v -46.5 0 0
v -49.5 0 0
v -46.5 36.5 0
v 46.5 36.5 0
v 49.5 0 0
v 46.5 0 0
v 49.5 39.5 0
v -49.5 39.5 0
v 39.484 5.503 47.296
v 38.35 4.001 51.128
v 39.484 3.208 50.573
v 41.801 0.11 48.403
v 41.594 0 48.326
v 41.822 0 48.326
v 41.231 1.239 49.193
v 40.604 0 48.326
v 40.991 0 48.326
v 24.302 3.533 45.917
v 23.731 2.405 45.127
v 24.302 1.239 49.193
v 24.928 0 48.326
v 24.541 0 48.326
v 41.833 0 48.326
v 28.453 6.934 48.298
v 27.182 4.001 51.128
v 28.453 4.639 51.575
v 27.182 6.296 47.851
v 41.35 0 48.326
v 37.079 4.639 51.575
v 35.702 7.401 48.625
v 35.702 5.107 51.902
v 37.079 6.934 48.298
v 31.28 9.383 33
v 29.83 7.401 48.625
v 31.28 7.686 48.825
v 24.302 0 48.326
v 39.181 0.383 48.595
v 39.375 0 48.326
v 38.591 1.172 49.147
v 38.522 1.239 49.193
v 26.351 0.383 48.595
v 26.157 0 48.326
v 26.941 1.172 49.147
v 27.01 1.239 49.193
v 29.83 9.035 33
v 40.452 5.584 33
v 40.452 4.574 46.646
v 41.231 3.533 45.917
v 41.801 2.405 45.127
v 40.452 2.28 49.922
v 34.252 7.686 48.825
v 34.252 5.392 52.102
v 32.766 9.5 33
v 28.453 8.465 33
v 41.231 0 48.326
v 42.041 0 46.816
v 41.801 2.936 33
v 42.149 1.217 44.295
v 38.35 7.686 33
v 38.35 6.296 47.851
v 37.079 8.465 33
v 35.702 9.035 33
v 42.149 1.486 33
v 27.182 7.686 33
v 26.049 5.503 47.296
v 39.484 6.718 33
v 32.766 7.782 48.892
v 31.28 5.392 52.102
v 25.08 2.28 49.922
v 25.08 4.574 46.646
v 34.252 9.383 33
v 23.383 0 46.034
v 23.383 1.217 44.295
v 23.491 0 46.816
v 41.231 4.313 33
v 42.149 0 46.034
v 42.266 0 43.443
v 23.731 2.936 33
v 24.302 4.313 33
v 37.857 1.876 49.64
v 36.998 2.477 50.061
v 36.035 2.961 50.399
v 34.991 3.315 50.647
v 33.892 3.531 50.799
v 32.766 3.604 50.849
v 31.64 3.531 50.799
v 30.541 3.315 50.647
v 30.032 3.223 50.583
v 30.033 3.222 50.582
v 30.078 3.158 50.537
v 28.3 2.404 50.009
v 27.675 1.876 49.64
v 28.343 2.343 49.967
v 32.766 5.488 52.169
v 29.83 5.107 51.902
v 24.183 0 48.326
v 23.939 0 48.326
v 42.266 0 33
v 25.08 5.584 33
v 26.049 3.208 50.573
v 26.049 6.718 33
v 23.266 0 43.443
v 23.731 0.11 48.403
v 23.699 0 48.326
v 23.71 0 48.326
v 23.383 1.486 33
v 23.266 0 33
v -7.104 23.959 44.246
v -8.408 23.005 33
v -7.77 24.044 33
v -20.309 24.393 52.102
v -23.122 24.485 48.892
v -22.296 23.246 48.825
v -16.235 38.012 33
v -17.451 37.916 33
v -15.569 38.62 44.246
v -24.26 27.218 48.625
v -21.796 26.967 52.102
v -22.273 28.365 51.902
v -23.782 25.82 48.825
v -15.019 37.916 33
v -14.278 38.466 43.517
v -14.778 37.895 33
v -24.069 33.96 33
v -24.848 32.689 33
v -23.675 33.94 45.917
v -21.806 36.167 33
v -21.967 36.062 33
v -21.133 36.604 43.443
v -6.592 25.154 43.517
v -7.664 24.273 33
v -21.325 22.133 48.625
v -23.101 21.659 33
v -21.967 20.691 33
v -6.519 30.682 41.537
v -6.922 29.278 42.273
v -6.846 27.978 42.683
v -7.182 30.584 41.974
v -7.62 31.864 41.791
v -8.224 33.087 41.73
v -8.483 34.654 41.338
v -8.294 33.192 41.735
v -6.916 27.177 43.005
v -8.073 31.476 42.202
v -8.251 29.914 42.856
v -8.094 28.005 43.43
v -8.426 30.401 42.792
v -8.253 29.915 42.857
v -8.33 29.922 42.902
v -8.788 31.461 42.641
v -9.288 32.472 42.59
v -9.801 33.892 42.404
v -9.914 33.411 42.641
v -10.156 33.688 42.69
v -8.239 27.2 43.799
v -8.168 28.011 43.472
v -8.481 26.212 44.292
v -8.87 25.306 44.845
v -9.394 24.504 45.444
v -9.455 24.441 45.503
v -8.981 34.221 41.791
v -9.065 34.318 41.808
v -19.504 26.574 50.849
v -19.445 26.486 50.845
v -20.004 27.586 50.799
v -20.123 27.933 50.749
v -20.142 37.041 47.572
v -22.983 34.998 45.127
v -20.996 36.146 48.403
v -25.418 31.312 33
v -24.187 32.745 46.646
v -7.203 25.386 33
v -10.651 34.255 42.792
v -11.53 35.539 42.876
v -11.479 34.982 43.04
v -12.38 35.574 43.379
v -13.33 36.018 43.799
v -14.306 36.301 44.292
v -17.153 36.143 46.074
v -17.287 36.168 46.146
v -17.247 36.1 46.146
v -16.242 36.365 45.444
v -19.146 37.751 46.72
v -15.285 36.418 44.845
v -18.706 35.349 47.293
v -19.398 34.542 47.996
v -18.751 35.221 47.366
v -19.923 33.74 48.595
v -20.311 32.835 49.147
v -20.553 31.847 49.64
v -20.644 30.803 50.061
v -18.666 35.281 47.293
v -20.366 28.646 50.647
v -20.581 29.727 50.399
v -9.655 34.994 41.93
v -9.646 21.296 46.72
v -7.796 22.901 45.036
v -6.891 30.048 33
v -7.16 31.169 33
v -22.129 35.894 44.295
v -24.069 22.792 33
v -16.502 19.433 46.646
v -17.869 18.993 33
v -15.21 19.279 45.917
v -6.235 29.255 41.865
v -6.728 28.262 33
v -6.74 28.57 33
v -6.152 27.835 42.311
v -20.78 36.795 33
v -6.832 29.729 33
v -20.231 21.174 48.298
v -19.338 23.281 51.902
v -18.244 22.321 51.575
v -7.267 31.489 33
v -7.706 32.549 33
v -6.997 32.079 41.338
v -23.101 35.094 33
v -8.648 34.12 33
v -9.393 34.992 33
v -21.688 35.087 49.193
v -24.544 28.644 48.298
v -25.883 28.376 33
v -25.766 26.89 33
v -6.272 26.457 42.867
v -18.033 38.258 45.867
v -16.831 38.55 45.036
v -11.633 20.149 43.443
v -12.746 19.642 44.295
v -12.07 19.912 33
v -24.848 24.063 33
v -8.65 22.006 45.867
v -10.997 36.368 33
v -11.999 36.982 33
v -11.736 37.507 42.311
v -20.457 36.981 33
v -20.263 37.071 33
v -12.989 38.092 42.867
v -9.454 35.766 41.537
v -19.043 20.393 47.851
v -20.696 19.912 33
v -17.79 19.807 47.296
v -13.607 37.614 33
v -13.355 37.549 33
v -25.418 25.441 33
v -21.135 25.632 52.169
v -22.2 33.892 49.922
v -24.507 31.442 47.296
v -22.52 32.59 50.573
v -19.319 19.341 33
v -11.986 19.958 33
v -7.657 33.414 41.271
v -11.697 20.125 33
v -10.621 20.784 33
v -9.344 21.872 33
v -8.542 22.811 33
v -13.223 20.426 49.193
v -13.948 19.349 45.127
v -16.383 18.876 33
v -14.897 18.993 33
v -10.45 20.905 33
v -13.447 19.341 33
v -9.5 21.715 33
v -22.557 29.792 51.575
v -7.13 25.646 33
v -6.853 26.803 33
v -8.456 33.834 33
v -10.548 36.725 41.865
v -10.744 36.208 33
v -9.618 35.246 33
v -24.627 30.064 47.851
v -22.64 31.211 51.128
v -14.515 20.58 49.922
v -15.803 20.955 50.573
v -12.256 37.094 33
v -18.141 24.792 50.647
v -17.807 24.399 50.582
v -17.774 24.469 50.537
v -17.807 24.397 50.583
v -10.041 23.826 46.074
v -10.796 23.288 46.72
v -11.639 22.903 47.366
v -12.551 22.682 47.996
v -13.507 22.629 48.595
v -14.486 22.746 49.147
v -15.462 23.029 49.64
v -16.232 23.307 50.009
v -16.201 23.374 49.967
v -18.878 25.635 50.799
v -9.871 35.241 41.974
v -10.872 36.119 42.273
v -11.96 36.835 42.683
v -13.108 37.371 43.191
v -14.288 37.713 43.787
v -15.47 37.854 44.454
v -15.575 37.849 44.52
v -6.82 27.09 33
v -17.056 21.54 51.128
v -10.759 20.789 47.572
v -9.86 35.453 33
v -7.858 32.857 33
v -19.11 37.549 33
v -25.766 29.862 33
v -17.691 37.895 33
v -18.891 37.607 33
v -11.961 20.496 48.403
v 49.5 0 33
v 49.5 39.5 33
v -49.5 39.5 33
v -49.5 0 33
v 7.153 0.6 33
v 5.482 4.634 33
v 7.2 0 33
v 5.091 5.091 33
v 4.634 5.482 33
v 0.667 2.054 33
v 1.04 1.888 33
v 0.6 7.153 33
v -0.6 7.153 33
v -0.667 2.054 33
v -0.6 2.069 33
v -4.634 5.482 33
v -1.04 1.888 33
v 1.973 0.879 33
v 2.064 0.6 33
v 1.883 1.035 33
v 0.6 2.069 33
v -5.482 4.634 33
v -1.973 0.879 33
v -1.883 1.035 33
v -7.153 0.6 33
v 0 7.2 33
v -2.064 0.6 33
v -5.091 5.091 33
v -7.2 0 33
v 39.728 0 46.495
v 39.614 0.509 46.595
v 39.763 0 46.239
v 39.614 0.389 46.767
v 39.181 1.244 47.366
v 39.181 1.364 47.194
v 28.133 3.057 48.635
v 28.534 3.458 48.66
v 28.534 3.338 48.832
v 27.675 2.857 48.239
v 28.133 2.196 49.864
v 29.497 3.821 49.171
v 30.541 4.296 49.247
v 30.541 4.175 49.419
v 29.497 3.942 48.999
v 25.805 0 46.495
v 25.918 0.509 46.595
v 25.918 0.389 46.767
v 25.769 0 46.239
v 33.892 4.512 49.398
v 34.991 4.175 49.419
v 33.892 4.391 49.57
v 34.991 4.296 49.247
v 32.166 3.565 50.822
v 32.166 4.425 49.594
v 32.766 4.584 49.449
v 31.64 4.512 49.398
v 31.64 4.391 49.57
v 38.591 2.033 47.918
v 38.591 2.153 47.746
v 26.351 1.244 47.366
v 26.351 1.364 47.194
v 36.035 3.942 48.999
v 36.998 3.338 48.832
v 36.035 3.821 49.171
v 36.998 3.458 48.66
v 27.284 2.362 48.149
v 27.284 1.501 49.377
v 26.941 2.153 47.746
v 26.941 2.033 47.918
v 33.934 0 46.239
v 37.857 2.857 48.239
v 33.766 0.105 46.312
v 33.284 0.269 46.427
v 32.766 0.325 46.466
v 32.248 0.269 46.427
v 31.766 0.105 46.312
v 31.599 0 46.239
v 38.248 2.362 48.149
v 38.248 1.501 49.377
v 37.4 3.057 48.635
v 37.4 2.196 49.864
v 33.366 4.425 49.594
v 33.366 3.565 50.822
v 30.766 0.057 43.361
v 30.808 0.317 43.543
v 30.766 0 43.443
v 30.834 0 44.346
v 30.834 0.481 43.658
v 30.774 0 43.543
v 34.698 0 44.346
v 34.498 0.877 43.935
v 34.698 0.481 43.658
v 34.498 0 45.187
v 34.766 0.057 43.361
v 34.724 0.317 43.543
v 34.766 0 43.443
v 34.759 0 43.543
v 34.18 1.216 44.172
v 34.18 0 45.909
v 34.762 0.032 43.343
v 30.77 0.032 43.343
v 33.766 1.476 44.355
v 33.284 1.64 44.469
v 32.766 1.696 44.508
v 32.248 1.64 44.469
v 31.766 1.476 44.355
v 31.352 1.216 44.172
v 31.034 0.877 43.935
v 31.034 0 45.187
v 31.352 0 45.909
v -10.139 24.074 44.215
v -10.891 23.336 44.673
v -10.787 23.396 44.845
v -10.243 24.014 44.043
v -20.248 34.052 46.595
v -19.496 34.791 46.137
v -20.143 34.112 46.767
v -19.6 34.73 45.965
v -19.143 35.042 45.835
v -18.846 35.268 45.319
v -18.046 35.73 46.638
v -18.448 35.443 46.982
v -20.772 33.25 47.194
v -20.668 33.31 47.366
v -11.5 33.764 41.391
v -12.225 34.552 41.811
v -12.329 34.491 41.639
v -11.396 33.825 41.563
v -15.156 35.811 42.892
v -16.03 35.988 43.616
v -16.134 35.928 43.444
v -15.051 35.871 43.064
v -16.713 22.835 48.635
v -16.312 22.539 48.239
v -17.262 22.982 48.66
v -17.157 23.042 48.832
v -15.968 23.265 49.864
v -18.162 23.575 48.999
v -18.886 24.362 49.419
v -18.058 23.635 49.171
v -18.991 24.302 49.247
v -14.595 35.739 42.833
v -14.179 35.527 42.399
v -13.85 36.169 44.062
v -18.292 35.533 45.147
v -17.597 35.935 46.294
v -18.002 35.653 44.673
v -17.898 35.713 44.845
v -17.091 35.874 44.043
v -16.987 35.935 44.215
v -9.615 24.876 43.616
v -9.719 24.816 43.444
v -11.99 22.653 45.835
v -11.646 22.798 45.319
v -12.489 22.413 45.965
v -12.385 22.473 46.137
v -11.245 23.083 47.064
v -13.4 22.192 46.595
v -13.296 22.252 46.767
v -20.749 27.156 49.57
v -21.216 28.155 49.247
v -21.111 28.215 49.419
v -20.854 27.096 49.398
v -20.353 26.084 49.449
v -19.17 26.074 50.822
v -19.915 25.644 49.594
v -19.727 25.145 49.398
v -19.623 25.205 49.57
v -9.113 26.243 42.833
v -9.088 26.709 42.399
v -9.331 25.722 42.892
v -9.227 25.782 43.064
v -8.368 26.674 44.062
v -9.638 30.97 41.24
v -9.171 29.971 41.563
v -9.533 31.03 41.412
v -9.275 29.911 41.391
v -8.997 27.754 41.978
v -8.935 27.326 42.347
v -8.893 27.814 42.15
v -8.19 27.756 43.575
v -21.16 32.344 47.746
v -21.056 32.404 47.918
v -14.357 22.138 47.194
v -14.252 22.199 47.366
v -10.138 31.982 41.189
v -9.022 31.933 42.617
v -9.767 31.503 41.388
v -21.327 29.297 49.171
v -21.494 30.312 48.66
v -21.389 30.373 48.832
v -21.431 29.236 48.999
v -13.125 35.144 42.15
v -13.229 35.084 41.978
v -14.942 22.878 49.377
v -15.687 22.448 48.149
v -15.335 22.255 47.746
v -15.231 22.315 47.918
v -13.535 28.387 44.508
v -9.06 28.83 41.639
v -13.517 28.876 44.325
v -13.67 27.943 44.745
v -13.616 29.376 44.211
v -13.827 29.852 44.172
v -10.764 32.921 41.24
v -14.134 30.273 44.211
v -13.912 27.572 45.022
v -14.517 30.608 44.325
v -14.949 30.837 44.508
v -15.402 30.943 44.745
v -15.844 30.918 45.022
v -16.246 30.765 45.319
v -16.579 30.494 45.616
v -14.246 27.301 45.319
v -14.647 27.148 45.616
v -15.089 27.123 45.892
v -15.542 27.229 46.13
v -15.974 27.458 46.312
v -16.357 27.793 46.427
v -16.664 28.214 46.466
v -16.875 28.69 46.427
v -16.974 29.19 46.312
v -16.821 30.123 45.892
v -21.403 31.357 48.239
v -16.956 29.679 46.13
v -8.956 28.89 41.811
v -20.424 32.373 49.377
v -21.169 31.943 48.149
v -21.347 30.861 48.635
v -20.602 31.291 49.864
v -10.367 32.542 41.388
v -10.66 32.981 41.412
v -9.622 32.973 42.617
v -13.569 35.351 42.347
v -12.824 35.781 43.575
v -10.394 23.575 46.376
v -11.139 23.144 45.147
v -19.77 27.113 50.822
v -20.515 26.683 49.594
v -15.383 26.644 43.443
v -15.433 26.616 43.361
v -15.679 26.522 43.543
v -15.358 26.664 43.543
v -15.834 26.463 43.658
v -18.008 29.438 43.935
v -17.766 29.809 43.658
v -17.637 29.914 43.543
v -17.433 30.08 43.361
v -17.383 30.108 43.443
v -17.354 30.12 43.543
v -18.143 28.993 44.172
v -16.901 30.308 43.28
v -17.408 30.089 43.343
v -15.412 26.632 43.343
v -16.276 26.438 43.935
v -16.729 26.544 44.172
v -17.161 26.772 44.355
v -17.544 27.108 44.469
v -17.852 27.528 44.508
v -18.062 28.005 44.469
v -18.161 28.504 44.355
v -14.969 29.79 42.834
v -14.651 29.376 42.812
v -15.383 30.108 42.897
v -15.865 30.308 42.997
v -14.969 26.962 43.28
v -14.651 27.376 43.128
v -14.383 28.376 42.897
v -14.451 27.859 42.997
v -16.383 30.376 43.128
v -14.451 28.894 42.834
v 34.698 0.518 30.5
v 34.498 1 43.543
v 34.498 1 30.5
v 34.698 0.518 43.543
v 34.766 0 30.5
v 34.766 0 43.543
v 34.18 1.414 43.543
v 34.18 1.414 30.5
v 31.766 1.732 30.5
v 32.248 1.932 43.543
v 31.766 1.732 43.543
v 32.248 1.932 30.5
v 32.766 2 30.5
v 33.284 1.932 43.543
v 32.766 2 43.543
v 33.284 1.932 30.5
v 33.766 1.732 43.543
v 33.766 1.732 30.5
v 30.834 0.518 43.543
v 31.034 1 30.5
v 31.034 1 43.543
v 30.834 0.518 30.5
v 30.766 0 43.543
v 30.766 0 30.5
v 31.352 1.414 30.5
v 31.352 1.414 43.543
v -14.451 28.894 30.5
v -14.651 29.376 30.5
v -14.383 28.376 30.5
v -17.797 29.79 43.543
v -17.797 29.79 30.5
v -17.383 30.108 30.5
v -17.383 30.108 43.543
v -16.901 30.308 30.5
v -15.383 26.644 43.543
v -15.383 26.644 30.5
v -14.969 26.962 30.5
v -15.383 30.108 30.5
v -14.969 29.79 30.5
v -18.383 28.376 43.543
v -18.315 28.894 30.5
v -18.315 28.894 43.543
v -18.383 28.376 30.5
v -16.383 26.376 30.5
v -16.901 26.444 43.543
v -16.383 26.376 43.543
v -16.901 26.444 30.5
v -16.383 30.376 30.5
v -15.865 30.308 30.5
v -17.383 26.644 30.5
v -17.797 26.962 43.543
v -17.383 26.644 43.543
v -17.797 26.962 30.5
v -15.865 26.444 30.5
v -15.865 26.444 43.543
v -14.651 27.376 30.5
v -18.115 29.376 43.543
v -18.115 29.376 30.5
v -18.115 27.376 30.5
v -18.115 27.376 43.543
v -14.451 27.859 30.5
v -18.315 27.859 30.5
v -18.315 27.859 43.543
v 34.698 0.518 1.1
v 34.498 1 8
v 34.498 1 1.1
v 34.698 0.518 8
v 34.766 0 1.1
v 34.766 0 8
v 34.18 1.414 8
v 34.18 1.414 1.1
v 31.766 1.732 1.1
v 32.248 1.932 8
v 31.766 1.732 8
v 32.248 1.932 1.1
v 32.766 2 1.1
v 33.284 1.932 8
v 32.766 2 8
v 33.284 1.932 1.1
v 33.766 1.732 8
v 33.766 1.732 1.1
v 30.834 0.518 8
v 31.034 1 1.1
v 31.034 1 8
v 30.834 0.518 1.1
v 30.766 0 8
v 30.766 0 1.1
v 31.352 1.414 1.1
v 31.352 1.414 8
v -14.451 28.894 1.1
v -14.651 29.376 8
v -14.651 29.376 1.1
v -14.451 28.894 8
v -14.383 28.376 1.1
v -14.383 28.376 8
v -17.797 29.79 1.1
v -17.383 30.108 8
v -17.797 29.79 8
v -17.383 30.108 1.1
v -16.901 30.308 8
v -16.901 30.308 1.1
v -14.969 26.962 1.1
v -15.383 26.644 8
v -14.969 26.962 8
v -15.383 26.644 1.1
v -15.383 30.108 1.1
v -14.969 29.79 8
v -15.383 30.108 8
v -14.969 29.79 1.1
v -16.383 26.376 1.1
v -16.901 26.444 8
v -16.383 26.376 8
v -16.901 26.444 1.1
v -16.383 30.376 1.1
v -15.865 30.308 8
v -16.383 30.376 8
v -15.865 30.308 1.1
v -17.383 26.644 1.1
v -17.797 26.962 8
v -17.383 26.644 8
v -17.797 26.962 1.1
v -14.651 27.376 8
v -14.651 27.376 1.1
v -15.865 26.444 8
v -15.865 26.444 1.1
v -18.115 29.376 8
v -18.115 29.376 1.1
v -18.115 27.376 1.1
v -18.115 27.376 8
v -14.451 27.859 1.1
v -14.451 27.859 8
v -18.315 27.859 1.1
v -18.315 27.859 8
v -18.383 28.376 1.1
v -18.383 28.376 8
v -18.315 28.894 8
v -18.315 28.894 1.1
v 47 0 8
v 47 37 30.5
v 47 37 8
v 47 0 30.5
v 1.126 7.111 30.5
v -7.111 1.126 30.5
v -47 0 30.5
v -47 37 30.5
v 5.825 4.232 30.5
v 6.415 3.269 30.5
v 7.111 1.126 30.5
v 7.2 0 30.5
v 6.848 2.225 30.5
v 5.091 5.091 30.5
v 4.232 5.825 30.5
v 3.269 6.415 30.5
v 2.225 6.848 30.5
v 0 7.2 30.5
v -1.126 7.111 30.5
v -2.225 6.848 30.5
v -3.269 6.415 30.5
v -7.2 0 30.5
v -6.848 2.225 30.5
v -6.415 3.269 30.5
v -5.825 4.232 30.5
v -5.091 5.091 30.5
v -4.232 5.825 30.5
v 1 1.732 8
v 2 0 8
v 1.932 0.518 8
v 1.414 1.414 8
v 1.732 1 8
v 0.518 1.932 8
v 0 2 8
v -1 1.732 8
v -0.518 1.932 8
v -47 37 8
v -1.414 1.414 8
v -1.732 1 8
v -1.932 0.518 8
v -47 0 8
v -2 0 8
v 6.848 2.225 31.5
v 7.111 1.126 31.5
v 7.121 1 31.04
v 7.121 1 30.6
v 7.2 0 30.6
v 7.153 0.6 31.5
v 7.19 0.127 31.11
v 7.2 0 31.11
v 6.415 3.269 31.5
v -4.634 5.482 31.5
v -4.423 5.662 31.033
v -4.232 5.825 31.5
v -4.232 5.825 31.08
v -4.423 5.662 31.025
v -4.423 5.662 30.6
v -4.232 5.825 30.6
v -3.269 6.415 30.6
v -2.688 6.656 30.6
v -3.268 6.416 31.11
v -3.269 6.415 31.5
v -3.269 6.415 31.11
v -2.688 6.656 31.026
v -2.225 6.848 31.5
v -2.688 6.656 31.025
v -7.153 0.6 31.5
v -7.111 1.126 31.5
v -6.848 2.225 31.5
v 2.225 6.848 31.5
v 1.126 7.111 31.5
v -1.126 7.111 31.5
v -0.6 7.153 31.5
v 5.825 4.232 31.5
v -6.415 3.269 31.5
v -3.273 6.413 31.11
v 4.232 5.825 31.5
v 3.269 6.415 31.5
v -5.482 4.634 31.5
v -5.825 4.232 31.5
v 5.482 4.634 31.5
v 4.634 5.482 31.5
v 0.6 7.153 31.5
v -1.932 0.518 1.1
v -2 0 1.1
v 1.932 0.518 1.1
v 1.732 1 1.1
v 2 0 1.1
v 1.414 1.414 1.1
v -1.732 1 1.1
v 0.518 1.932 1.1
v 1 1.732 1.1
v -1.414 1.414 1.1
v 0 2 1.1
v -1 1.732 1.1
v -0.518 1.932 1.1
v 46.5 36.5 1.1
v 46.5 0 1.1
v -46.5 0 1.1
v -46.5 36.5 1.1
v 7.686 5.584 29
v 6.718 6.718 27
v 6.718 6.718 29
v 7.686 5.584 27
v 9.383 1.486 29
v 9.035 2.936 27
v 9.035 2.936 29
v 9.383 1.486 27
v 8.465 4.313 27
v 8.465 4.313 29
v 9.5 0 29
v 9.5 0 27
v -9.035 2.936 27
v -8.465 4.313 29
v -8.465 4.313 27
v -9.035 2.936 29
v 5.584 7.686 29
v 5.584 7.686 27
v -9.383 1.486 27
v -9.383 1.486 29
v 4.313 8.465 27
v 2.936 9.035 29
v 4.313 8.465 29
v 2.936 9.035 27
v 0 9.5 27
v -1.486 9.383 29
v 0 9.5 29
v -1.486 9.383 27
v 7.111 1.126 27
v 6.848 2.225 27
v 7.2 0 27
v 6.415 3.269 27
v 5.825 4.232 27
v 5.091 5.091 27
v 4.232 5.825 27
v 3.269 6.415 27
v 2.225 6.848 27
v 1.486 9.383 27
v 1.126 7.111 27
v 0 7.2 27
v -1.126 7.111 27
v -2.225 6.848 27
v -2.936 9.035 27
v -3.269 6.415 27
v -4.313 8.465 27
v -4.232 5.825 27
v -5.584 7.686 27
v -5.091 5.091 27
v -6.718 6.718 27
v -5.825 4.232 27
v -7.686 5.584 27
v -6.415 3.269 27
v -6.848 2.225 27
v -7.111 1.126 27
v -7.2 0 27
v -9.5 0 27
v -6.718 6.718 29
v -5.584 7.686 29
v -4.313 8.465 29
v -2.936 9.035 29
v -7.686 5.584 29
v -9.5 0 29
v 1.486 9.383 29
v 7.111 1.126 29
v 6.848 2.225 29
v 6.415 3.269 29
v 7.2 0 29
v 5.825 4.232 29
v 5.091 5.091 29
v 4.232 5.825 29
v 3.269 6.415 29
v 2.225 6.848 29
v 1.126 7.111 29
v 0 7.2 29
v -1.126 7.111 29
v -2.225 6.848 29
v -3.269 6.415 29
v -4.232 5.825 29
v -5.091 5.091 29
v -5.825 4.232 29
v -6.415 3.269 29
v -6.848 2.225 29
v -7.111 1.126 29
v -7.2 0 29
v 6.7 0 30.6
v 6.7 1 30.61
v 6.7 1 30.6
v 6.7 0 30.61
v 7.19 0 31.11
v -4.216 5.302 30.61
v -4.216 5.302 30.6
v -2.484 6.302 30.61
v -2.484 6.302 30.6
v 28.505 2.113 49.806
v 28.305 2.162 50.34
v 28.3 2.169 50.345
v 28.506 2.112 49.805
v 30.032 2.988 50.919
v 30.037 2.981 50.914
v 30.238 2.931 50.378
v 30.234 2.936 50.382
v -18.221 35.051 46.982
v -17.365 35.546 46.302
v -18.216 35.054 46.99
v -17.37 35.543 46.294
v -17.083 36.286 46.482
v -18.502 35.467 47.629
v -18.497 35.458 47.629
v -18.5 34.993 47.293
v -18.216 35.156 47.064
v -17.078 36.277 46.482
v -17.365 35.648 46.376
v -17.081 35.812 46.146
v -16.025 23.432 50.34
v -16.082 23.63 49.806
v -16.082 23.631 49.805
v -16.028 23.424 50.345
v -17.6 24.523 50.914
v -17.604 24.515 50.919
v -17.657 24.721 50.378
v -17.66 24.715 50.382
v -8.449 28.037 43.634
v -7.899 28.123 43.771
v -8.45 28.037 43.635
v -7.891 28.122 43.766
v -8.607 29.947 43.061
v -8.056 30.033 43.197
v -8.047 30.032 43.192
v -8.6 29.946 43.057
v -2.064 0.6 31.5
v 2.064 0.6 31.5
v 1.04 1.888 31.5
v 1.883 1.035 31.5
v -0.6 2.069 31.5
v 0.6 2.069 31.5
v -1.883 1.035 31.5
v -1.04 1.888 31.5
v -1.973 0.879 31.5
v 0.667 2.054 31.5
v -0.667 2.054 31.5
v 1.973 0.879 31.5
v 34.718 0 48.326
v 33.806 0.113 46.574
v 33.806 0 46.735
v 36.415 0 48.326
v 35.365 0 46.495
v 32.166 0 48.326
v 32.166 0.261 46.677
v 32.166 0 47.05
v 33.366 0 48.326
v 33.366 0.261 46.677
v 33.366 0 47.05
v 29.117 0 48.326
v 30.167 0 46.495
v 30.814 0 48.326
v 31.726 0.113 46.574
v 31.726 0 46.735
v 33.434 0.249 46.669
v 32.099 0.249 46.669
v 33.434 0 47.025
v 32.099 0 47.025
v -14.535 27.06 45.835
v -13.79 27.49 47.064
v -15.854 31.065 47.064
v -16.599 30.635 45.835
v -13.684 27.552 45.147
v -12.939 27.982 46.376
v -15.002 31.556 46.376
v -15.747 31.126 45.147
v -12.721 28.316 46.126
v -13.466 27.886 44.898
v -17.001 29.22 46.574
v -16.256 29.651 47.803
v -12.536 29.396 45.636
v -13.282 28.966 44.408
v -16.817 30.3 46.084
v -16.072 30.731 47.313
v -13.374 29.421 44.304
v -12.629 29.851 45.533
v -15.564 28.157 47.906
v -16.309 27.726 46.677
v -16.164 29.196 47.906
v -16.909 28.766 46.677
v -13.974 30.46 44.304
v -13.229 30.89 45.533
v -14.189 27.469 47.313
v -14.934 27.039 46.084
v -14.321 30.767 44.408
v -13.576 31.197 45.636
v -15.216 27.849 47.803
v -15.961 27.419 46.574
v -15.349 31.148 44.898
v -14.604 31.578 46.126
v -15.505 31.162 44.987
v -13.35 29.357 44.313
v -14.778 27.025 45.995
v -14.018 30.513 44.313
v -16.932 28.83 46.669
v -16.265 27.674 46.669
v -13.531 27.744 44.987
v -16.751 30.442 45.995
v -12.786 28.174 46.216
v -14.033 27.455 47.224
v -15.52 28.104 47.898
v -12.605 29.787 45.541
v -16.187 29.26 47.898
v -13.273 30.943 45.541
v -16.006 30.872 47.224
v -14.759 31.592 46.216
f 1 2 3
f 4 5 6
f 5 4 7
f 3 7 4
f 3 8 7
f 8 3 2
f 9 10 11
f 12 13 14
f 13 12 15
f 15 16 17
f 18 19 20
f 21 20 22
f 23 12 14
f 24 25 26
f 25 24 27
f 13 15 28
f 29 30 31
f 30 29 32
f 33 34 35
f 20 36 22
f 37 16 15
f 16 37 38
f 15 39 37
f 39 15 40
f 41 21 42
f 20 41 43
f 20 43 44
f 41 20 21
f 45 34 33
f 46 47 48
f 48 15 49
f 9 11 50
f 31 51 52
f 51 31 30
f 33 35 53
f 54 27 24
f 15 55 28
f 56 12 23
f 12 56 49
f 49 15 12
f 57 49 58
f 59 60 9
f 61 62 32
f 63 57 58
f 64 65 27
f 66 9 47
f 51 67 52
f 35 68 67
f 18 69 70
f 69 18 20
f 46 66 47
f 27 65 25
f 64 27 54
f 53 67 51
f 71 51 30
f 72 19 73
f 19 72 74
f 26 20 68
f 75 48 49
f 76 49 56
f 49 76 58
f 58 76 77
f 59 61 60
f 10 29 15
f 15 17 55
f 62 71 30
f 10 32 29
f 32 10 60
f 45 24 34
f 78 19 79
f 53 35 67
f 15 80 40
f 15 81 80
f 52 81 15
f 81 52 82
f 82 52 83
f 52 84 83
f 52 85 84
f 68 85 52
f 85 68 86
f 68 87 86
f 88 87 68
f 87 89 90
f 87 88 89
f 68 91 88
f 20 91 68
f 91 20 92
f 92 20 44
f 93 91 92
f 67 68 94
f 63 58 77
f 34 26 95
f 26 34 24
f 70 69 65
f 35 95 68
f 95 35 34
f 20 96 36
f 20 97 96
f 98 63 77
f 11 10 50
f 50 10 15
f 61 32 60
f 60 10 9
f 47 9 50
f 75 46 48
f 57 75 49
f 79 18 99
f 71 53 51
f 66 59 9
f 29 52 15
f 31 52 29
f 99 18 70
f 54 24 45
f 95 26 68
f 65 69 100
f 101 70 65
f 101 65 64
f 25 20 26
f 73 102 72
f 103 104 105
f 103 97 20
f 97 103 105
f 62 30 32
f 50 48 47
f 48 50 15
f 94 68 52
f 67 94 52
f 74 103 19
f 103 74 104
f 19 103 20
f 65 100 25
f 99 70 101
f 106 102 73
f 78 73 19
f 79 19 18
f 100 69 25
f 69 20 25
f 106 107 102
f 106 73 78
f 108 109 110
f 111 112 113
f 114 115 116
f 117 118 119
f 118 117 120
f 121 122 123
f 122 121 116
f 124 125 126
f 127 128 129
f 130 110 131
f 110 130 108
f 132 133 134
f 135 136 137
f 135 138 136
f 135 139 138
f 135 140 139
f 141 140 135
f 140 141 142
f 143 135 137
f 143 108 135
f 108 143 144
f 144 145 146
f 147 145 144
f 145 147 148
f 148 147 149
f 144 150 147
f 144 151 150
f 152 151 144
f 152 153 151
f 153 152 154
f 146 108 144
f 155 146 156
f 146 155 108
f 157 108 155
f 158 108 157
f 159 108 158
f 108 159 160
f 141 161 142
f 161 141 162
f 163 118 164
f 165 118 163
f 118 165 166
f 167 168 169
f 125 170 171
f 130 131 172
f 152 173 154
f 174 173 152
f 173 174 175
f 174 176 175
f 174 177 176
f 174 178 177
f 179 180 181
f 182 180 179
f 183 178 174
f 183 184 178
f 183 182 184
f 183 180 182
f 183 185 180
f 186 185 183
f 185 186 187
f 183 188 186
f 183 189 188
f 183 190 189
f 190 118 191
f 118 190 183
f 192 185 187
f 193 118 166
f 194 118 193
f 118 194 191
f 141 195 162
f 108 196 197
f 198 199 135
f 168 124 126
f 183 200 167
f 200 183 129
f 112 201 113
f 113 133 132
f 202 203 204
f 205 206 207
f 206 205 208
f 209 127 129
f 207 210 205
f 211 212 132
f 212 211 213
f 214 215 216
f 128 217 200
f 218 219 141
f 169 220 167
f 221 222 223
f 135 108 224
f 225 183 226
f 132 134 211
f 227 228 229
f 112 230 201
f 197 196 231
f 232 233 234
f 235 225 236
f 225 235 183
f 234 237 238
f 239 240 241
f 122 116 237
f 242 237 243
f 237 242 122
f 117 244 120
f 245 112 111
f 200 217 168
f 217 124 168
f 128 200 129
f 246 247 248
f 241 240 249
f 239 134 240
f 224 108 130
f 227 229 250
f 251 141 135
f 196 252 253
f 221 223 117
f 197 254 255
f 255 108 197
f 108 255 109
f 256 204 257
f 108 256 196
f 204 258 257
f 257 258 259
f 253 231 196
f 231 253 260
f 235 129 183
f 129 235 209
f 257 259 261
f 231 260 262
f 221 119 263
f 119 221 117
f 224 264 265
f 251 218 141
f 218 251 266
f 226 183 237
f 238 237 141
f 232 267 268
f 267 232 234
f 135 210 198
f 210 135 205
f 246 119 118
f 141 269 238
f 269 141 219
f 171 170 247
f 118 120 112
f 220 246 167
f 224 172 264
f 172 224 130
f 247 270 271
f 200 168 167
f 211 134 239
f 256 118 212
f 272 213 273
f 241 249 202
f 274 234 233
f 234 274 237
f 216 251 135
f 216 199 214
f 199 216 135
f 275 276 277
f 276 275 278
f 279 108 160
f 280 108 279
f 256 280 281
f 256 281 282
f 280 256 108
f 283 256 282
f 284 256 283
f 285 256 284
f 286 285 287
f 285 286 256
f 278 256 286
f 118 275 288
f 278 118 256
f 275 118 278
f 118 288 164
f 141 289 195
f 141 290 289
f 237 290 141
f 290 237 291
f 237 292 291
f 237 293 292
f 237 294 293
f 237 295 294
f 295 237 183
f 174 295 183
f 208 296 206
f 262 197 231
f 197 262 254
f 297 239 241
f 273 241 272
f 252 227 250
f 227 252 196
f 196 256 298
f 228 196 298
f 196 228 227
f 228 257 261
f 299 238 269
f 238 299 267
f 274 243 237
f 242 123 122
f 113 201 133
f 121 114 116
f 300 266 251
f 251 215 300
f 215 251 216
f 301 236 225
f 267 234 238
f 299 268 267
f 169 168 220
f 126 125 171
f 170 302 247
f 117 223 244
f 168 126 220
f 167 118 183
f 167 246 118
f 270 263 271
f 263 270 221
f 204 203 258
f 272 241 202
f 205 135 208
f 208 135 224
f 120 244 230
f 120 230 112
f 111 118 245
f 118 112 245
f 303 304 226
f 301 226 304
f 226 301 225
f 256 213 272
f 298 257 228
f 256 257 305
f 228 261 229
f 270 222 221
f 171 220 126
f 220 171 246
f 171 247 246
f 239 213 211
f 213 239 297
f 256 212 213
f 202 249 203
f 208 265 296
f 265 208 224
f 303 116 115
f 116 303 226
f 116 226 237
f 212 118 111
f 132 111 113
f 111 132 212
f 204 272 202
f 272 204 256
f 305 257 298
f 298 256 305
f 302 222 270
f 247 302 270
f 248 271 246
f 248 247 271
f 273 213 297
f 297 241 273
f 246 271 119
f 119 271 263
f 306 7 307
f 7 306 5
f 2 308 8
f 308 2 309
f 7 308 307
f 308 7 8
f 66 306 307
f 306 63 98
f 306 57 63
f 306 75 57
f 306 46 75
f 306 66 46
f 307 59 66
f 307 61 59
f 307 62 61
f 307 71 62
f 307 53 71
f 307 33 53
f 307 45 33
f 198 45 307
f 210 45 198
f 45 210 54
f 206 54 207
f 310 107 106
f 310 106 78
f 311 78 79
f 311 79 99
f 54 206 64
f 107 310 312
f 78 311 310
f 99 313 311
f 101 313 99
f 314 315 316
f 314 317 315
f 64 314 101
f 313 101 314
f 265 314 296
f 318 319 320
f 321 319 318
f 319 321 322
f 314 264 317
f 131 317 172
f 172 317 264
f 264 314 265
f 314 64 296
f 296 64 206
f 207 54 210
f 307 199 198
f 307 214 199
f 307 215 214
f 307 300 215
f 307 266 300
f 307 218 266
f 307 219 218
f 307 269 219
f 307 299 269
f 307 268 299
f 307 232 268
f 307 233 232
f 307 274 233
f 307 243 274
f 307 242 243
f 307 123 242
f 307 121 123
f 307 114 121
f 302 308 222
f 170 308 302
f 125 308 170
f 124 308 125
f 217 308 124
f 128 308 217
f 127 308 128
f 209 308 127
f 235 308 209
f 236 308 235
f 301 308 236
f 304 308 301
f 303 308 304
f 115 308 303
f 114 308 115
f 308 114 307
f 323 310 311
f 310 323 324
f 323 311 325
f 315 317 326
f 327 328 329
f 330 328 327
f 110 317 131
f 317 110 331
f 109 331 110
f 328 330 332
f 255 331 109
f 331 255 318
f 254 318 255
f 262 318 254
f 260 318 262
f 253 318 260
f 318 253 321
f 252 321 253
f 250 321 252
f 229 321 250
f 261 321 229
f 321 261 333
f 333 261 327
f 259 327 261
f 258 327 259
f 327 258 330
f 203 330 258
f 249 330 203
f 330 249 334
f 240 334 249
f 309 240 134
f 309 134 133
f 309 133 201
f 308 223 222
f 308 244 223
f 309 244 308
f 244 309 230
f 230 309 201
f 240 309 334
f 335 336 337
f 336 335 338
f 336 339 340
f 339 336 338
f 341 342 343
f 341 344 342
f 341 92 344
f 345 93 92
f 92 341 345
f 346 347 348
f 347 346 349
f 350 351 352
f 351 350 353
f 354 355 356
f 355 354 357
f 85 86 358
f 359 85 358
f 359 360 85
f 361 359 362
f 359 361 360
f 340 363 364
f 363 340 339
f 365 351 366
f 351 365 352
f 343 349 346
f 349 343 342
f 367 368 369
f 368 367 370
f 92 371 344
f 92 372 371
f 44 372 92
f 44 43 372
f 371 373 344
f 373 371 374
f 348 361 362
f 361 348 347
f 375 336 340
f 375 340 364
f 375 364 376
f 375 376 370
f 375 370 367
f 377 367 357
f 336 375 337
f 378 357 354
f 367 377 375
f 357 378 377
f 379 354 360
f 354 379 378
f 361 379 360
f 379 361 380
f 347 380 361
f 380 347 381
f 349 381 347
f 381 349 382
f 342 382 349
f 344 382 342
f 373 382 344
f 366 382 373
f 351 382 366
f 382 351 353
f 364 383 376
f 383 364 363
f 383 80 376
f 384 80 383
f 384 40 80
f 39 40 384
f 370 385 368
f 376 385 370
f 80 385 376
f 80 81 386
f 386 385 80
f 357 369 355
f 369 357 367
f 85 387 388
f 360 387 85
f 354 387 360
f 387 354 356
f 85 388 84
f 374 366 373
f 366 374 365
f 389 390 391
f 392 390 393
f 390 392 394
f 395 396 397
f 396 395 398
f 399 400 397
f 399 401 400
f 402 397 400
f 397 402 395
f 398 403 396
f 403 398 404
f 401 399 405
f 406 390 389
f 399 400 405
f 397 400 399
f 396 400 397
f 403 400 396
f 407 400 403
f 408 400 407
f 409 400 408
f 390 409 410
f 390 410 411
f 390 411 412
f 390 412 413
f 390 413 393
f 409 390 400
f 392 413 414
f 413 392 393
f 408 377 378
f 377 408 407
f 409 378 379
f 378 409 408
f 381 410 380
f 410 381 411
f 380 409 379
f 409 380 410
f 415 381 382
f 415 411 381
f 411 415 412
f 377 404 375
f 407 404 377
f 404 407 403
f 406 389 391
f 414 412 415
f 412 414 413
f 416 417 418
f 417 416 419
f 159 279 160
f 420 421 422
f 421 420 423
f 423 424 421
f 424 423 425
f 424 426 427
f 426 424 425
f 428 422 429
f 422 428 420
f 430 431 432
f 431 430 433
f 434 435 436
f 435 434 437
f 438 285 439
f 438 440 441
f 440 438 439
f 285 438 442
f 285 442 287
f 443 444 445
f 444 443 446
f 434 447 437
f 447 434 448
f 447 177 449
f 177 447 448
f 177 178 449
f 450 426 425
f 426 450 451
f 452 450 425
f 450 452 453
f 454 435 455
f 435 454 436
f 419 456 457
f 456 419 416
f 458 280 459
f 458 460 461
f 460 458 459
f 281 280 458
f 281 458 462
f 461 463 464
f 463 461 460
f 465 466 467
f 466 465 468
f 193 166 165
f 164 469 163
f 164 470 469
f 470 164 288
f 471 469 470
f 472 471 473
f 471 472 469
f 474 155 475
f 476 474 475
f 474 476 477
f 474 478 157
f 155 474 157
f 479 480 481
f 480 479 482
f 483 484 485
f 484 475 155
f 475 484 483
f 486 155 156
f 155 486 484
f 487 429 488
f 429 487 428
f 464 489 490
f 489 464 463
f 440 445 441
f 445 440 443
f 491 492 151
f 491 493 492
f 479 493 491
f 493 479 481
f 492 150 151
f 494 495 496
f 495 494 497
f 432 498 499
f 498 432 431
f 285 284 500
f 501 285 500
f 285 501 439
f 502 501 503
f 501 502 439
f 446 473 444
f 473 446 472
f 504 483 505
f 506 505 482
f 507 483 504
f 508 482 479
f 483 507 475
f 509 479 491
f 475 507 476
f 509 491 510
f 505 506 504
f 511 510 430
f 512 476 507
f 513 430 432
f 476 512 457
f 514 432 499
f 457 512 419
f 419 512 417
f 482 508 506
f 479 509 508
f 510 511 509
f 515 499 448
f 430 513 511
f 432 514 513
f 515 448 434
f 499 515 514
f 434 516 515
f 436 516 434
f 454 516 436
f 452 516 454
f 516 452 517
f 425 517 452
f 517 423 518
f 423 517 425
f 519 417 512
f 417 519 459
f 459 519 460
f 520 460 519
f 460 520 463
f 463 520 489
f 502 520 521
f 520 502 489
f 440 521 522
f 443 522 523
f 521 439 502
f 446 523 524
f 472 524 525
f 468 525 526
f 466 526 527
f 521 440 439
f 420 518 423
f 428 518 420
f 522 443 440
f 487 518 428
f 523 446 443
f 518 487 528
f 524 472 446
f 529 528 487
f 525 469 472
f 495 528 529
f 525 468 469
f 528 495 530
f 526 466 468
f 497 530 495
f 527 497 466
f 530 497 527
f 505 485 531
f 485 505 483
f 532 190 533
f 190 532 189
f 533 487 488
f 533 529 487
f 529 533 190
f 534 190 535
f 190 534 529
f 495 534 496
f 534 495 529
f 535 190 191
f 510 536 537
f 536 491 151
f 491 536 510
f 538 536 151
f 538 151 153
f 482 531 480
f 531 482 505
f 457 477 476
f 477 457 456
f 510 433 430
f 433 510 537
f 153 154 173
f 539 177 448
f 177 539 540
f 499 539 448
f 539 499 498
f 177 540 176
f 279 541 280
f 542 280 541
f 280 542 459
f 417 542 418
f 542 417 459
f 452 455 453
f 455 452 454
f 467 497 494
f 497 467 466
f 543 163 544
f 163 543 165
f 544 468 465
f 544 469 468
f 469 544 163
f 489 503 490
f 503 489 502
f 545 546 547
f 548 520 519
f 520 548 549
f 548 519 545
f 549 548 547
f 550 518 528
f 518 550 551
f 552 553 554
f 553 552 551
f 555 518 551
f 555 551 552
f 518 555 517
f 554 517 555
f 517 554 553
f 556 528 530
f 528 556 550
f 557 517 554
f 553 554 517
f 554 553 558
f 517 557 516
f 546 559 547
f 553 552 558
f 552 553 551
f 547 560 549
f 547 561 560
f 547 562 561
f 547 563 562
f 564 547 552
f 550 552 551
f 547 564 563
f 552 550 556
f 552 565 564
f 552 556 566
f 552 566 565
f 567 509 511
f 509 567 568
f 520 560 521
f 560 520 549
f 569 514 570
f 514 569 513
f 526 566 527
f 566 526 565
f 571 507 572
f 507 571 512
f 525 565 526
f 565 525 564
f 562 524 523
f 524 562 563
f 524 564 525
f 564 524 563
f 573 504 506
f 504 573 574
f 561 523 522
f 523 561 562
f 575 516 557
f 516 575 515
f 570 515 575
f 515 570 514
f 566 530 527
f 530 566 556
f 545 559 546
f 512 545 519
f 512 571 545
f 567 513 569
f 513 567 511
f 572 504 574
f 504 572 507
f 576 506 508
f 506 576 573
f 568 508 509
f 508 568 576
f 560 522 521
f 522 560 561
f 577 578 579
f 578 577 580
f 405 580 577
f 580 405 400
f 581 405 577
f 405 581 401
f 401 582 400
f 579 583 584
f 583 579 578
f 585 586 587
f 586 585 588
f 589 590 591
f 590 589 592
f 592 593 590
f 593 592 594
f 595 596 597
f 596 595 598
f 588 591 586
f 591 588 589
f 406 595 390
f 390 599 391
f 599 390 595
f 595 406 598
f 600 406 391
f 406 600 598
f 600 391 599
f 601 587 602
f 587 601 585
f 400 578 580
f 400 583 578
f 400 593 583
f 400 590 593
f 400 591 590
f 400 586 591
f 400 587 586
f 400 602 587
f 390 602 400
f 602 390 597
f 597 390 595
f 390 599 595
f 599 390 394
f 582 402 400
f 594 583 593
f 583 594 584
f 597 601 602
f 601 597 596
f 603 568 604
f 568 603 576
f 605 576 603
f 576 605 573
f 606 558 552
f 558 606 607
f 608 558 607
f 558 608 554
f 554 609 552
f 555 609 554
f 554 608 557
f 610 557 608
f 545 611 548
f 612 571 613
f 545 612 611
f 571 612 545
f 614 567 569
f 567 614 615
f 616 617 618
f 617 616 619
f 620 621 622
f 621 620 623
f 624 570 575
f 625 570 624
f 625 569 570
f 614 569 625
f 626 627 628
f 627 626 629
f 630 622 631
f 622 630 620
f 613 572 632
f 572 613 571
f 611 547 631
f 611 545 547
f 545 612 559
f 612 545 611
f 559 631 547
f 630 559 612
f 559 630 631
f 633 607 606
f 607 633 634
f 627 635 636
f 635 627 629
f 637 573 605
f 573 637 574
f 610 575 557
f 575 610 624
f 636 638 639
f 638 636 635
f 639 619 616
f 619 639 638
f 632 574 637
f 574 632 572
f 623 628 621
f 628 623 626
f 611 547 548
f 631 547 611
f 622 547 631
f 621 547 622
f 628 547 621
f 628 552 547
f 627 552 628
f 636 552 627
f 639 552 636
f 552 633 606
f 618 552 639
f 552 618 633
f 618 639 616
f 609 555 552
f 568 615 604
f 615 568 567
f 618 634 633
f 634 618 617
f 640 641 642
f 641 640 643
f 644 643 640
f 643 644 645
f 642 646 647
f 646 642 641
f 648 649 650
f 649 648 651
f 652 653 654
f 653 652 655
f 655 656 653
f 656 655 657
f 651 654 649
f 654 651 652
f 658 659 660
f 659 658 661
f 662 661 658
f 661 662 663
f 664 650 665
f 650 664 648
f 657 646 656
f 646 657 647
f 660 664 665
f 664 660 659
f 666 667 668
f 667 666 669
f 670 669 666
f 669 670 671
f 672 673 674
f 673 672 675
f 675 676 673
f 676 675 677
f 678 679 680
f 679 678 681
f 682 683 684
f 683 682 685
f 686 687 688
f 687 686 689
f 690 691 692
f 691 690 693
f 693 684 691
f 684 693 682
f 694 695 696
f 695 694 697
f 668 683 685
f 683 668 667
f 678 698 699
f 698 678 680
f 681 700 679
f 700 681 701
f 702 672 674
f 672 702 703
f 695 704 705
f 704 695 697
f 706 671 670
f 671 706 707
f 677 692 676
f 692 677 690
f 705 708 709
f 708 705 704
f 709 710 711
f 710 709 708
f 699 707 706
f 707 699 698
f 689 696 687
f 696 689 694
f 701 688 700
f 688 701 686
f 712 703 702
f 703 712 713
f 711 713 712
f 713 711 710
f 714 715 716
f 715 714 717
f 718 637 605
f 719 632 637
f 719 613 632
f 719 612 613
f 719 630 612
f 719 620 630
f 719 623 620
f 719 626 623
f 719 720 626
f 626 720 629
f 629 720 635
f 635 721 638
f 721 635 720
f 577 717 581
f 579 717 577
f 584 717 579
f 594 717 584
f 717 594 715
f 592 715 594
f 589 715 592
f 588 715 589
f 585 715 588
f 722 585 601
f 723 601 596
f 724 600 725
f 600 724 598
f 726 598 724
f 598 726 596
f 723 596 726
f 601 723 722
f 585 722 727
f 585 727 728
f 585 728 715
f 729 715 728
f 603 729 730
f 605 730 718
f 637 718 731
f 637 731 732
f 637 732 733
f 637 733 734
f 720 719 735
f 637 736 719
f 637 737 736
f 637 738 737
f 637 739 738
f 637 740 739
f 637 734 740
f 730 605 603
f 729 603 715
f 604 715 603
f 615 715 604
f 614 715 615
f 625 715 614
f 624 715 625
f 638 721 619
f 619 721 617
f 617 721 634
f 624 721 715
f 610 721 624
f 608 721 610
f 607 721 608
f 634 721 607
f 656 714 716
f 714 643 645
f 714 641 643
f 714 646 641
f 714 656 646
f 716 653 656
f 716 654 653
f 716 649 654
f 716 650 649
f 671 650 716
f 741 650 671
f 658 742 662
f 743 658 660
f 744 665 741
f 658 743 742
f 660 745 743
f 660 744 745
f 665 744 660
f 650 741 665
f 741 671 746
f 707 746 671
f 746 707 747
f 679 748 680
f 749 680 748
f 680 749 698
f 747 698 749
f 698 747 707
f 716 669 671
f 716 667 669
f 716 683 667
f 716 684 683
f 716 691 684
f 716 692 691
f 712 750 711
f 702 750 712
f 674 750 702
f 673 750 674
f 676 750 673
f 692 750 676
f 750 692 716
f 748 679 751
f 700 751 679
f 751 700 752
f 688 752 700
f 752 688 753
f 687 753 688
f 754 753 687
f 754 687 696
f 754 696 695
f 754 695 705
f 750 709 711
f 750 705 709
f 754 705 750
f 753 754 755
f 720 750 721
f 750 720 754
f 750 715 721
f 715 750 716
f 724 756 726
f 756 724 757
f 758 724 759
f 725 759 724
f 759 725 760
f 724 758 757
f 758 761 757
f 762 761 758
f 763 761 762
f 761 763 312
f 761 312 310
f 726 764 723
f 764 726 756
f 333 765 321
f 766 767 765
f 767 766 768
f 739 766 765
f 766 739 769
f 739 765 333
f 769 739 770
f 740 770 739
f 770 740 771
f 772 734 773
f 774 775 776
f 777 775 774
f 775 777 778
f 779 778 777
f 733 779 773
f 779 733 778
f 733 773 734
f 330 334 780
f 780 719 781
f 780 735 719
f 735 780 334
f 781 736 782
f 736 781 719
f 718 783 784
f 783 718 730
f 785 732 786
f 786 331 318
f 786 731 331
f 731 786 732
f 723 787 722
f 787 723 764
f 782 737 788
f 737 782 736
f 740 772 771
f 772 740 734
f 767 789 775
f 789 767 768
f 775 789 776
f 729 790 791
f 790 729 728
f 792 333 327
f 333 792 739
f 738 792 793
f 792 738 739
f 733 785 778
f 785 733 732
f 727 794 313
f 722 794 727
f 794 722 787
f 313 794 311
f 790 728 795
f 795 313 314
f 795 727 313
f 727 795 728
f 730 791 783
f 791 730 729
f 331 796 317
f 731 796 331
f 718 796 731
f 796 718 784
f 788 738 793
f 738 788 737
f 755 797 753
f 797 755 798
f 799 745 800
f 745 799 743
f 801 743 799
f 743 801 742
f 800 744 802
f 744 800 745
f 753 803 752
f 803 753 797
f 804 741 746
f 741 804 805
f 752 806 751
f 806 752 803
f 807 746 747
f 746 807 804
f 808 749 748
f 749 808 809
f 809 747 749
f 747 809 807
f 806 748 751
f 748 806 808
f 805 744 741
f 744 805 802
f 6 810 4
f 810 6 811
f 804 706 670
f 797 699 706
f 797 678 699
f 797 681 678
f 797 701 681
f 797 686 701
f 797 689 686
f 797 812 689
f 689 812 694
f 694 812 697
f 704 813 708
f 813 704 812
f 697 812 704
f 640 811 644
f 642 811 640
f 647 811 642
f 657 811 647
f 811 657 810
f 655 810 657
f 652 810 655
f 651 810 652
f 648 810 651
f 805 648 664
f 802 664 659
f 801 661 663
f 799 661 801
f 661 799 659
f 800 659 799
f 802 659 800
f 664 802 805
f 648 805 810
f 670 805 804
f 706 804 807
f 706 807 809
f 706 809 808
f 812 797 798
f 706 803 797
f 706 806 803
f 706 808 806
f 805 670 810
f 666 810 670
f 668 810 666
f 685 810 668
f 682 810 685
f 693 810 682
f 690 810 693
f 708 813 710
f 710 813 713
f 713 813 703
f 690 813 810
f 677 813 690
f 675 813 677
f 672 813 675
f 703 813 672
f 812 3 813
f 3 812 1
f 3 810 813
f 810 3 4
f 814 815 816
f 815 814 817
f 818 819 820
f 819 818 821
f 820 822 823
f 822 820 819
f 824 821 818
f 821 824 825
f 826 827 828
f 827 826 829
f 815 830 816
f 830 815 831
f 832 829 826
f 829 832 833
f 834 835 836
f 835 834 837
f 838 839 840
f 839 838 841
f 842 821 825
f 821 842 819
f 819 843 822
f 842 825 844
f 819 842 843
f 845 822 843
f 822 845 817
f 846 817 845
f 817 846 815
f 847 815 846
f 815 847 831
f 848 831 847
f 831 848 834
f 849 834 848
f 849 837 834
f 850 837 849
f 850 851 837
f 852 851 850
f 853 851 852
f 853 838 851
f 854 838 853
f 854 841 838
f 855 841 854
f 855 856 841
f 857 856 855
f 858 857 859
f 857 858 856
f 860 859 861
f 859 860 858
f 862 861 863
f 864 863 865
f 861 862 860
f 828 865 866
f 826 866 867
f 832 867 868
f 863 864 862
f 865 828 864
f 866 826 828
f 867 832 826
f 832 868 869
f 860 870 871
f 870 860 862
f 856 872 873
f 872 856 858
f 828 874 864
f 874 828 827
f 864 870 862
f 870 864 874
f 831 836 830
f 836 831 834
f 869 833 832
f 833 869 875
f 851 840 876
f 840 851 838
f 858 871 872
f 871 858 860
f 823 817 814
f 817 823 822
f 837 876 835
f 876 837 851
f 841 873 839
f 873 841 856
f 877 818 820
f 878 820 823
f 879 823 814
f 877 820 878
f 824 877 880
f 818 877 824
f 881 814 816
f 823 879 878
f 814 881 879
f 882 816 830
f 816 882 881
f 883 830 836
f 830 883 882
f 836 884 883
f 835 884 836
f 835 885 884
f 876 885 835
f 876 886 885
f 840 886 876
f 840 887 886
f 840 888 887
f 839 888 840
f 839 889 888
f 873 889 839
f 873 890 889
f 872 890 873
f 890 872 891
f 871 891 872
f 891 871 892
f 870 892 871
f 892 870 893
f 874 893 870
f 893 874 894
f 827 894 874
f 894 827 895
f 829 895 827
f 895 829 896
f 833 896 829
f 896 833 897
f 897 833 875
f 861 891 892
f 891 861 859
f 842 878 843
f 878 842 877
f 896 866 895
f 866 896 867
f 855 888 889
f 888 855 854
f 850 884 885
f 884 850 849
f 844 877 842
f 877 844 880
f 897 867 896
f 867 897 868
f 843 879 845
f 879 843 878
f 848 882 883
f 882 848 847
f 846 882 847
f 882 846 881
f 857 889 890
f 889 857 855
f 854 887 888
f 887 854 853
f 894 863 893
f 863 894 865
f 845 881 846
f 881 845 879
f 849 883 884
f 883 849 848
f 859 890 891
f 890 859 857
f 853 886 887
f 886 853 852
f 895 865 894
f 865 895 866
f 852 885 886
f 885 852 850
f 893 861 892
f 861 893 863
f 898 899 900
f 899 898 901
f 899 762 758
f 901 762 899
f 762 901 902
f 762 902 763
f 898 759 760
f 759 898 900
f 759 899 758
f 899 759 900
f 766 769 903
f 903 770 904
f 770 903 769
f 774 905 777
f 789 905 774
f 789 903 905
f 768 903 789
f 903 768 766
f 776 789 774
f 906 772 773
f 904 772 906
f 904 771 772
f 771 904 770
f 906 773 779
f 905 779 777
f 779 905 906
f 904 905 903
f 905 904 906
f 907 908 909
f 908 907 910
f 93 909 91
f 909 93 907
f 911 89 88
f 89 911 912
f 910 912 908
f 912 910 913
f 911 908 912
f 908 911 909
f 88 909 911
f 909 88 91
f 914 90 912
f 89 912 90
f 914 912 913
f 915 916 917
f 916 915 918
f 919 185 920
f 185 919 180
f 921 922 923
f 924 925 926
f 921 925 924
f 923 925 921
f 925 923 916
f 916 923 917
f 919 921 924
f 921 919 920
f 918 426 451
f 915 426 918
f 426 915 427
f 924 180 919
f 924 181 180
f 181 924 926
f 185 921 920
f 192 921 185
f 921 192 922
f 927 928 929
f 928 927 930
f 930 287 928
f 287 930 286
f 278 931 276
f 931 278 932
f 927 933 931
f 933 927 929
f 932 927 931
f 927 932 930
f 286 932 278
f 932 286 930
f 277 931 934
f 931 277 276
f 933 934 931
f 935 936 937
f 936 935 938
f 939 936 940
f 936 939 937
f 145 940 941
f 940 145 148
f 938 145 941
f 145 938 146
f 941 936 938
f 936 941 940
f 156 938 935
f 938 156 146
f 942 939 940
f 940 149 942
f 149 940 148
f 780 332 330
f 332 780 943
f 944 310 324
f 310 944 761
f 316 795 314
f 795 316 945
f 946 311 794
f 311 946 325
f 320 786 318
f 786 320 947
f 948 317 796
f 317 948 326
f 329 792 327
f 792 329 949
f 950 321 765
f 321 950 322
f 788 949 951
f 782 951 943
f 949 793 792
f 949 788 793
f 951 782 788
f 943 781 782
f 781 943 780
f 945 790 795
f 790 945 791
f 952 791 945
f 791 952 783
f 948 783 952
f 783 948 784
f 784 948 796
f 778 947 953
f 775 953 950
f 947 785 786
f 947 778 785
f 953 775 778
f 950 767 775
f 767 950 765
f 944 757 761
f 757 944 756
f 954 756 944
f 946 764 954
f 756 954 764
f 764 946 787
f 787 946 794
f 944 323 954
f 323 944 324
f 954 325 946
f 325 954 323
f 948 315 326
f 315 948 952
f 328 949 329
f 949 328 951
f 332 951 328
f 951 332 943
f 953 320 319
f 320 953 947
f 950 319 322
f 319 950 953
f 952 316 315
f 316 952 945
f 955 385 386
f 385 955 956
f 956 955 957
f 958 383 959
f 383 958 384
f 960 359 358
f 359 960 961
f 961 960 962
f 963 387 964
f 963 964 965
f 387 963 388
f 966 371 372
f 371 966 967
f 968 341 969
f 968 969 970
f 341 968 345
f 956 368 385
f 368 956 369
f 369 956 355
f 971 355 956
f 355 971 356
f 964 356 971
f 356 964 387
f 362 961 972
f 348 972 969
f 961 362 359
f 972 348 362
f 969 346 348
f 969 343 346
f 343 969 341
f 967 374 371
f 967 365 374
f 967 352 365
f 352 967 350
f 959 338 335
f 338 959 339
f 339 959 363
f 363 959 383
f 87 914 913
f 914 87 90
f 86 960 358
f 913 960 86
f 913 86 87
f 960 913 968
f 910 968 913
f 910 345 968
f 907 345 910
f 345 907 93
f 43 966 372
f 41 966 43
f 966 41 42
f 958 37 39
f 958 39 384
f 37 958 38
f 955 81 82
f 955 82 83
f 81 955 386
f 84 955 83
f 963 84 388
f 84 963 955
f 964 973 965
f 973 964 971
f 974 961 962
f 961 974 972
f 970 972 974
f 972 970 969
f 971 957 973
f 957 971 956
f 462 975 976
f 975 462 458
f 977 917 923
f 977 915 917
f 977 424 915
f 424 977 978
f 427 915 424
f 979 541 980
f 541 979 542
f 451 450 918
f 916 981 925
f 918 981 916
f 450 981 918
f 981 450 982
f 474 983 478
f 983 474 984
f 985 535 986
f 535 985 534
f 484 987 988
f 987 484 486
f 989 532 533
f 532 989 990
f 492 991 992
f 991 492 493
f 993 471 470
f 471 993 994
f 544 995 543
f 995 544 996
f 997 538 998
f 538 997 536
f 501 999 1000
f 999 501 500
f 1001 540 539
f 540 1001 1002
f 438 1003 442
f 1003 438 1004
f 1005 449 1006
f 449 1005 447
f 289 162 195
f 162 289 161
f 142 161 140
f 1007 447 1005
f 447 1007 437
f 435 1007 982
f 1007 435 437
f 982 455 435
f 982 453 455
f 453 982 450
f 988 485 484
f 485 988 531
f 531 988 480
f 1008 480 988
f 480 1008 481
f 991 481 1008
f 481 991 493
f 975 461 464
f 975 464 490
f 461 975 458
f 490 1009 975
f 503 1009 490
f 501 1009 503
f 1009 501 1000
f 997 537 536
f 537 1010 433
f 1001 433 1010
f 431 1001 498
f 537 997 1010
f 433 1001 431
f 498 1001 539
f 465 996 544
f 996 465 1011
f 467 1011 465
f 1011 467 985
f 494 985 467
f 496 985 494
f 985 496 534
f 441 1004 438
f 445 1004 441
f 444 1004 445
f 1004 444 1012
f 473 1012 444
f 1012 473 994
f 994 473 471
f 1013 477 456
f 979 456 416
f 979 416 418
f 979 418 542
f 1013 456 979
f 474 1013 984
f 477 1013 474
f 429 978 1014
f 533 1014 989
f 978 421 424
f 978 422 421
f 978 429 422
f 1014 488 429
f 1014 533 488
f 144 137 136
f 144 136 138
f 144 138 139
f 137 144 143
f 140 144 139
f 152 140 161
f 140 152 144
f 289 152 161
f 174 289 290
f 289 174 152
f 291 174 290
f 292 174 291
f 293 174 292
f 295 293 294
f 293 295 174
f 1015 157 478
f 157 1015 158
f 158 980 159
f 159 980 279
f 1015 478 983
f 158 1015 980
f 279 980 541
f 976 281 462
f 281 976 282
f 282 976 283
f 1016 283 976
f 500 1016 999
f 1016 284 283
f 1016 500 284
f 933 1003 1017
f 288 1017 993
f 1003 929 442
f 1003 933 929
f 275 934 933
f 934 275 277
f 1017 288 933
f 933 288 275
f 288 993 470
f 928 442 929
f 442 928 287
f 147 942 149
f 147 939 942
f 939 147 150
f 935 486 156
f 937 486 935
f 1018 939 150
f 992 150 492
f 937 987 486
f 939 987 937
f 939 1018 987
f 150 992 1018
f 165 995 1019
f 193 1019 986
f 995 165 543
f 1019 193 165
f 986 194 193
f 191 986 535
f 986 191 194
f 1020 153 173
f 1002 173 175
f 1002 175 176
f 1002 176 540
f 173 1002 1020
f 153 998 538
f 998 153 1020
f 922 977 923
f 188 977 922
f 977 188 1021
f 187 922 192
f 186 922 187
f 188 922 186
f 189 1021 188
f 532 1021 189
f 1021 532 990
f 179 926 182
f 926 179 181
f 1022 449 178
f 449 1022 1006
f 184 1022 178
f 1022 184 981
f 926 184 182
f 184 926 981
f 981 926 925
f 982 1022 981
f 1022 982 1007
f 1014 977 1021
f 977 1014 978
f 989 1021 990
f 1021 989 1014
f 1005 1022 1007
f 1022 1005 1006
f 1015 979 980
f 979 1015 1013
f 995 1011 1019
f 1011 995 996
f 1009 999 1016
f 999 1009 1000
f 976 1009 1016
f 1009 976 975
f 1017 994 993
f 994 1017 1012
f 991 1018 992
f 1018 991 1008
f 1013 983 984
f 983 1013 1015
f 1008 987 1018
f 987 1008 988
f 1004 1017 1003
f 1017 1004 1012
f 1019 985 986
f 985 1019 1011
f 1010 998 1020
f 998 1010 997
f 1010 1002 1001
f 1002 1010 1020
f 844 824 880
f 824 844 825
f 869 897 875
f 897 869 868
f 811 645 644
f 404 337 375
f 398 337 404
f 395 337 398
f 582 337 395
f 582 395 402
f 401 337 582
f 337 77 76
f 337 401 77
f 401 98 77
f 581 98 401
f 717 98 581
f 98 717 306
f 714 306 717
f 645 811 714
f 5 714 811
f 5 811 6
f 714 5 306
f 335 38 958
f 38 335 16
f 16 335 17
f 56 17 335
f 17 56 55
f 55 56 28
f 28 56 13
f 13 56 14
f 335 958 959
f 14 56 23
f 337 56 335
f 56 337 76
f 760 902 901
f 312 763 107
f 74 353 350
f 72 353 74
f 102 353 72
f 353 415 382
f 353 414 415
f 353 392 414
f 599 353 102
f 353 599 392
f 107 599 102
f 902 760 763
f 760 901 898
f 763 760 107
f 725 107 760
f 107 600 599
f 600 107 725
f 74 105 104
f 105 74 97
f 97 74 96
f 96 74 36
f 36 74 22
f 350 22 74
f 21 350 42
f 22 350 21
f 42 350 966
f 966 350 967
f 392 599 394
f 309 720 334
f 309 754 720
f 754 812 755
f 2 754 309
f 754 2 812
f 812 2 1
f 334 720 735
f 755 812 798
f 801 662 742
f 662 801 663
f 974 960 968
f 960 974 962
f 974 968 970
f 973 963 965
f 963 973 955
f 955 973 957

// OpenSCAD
use <station_mic_lid.scad>

difference() {
    mic_lid();
    // Cut away the back half to reveal vertical cross-section
    translate([-200, -200, -10])
    cube([400, 200, 200]);
}
